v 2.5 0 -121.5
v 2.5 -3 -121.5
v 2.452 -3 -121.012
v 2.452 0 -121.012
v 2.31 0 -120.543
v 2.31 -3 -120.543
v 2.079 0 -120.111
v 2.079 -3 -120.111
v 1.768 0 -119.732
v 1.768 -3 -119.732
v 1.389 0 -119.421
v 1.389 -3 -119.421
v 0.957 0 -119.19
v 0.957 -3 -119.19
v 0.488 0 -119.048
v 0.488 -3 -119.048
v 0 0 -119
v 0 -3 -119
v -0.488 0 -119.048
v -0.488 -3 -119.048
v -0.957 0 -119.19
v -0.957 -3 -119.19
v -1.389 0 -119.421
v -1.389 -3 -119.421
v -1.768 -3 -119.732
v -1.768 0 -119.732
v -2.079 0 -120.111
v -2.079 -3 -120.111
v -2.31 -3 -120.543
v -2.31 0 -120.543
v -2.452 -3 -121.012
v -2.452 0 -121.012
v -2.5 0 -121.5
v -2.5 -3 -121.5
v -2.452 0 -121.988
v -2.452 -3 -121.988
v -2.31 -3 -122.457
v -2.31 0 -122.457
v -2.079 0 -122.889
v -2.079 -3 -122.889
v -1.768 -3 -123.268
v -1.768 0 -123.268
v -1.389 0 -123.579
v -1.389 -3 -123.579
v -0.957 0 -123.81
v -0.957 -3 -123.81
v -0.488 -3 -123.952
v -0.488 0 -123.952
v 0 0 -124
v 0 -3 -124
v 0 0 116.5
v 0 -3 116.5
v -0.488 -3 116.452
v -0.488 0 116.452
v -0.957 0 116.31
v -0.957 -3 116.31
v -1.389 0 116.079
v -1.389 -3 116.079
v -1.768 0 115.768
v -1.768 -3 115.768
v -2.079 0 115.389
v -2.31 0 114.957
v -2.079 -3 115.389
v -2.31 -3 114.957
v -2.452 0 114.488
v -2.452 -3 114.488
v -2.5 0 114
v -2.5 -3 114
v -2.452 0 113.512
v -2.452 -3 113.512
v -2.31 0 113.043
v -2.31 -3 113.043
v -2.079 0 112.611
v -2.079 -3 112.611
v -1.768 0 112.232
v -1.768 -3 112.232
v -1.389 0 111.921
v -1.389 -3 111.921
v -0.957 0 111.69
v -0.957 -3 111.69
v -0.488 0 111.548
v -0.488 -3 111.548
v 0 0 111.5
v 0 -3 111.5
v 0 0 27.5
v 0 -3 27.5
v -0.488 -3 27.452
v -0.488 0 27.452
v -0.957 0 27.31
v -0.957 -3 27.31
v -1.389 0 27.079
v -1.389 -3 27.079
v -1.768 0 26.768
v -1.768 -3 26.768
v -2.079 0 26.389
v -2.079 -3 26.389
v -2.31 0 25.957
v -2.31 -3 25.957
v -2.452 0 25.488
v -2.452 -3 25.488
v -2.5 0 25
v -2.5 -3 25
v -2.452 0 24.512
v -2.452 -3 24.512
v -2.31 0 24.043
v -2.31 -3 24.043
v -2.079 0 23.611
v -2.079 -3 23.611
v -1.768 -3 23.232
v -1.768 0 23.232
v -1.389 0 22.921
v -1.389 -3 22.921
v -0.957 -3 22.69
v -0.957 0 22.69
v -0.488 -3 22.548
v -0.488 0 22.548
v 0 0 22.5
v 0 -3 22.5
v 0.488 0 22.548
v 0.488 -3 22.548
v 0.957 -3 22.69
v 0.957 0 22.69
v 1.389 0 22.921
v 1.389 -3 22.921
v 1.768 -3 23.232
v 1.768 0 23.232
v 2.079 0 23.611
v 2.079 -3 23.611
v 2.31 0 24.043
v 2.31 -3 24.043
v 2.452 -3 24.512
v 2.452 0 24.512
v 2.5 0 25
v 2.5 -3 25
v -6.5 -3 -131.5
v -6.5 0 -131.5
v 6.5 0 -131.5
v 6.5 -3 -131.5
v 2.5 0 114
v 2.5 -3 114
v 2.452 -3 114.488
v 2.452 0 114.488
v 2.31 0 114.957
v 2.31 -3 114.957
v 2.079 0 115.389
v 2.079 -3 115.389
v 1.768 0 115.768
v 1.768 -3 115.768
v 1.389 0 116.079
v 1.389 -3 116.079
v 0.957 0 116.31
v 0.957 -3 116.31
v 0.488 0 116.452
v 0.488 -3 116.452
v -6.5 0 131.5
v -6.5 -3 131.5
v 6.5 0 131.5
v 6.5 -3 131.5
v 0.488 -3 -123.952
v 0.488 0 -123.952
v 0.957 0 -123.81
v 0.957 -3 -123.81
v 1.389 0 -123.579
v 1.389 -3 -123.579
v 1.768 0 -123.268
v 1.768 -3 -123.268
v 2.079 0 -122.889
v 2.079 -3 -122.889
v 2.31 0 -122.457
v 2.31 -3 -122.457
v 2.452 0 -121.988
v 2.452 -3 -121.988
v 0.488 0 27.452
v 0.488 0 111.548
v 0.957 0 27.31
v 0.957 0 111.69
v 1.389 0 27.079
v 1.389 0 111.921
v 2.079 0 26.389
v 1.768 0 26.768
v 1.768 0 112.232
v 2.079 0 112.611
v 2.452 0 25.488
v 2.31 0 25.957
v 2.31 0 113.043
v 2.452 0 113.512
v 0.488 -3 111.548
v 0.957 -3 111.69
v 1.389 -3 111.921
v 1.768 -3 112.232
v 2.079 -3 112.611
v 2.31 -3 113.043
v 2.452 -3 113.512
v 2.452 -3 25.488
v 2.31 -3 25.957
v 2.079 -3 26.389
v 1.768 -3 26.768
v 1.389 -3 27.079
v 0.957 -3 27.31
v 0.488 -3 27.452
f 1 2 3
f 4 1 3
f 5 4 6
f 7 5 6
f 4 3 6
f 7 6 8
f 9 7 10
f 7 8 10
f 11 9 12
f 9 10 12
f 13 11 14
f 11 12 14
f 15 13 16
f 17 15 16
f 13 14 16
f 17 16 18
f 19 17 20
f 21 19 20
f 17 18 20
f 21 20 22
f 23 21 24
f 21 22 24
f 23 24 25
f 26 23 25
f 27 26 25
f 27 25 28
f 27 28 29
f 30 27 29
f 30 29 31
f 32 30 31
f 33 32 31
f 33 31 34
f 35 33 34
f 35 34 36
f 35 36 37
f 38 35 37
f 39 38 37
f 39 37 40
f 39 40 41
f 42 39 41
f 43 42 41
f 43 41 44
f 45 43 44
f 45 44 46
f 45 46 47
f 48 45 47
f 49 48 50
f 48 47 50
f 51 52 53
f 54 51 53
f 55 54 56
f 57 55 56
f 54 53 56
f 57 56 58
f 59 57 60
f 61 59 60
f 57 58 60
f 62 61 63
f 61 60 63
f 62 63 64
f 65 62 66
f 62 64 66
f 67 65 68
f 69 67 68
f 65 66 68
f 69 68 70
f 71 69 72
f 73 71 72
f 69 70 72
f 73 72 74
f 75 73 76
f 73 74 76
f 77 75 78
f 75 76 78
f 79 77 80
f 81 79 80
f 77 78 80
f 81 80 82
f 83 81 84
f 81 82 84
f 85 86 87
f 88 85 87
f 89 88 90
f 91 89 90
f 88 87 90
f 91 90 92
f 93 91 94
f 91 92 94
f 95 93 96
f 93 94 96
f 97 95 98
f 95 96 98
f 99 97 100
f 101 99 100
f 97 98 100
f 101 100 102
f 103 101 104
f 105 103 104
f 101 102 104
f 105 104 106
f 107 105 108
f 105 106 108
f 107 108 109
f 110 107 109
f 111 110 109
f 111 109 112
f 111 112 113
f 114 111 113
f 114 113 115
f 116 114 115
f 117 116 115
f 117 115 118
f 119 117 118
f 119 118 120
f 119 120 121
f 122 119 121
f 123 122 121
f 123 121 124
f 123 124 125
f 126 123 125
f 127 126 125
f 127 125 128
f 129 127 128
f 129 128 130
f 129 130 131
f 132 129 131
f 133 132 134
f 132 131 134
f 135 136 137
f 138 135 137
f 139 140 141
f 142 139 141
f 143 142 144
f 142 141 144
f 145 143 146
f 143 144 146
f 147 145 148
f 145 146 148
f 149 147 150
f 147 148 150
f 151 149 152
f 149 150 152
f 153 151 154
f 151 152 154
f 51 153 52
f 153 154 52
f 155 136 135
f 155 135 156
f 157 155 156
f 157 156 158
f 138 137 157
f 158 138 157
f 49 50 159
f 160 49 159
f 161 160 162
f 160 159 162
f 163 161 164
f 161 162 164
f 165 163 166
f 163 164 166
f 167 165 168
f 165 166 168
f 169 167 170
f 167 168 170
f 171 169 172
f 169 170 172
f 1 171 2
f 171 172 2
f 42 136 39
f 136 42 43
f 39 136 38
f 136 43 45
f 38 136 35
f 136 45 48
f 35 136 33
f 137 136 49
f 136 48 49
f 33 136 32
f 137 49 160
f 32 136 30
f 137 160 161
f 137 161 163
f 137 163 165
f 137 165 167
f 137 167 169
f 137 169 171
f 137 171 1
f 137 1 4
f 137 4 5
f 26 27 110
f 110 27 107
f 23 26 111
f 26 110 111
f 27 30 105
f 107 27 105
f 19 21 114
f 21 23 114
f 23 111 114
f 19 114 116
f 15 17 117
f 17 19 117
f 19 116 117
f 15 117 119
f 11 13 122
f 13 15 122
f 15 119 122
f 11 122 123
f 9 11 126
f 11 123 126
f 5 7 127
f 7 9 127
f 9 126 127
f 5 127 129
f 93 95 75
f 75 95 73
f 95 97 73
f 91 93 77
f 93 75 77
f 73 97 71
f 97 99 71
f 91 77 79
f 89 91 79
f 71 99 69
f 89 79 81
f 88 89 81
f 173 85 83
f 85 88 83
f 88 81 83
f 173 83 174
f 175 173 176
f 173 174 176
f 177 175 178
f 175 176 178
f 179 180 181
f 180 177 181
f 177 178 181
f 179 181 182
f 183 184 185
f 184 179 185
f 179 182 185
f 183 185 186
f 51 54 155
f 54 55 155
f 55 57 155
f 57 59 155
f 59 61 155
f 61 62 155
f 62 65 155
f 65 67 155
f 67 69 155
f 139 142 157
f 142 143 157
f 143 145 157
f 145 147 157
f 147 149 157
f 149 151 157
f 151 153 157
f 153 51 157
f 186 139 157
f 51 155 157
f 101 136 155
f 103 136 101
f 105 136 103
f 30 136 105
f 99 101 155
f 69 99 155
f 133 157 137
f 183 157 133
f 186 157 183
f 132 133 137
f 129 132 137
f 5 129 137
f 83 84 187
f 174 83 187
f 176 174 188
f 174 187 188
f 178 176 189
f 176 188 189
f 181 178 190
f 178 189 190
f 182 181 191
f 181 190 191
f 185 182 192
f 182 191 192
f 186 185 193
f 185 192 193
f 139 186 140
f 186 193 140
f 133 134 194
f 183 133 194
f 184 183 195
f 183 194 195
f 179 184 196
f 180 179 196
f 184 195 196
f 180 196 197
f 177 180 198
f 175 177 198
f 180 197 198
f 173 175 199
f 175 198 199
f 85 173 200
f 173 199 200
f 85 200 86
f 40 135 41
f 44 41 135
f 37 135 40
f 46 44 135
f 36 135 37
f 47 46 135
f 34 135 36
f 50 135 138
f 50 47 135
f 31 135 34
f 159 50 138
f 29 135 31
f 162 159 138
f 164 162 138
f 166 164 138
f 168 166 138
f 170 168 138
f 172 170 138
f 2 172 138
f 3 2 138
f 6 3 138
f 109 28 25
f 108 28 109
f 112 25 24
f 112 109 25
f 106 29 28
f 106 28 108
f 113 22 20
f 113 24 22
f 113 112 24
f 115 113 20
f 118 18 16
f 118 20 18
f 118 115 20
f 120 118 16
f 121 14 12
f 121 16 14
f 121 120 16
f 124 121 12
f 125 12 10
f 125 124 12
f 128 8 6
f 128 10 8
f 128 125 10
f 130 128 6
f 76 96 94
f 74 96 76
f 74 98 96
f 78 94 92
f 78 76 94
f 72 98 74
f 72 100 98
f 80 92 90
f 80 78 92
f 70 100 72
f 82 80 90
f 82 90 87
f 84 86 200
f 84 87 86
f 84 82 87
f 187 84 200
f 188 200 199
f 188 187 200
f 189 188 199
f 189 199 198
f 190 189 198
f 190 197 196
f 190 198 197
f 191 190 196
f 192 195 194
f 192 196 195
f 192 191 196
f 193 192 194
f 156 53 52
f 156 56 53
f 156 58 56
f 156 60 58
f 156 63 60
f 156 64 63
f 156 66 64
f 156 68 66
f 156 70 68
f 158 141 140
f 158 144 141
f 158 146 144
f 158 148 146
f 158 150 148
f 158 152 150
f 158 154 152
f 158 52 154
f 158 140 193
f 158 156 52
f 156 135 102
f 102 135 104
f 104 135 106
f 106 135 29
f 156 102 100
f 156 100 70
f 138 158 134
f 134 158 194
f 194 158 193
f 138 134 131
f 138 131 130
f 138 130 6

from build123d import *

# Parameters (mm, degrees)
F0_W     = 13
F0_H     = 263
F1_DEPTH = 3
F3_DEPTH = 25


with BuildPart() as f1:
    # F0 (on Front) → F1 (new body)
    with BuildSketch(Plane.XZ):
        Rectangle(F0_W, F0_H)
    extrude(amount=F1_DEPTH)

    # F2 (on face) → F3 (cut)
    with BuildSketch(Plane.XZ.offset(3)):
        with BuildLine():
            ThreePointArc((2.5, 25), (1.767766953, 26.767766953), (0, 27.5))
            ThreePointArc((0, 27.5), (-1.767766953, 23.232233047), (2.5, 25))
        make_face()
        with BuildLine():
            ThreePointArc((2.5, 114), (1.767766953, 115.767766953), (0, 116.5))
            Line((0, 116.5), (0, 114))
            Line((0, 114), (0, 111.5))
            ThreePointArc((0, 111.5), (1.767766953, 112.232233047), (2.5, 114))
        make_face()
        with BuildLine():
            Line((0, 114), (0, 116.5))
            ThreePointArc((0, 116.5), (-2.5, 114), (0, 111.5))
            Line((0, 111.5), (0, 114))
        make_face()
        with BuildLine():
            ThreePointArc((2.5, -121.5), (-1.767766953, -119.732233047), (0, -124))
            ThreePointArc((0, -124), (1.767766953, -123.267766953), (2.5, -121.5))
        make_face()
    extrude(amount=-F3_DEPTH, mode=Mode.SUBTRACT)


solid = f1.part
